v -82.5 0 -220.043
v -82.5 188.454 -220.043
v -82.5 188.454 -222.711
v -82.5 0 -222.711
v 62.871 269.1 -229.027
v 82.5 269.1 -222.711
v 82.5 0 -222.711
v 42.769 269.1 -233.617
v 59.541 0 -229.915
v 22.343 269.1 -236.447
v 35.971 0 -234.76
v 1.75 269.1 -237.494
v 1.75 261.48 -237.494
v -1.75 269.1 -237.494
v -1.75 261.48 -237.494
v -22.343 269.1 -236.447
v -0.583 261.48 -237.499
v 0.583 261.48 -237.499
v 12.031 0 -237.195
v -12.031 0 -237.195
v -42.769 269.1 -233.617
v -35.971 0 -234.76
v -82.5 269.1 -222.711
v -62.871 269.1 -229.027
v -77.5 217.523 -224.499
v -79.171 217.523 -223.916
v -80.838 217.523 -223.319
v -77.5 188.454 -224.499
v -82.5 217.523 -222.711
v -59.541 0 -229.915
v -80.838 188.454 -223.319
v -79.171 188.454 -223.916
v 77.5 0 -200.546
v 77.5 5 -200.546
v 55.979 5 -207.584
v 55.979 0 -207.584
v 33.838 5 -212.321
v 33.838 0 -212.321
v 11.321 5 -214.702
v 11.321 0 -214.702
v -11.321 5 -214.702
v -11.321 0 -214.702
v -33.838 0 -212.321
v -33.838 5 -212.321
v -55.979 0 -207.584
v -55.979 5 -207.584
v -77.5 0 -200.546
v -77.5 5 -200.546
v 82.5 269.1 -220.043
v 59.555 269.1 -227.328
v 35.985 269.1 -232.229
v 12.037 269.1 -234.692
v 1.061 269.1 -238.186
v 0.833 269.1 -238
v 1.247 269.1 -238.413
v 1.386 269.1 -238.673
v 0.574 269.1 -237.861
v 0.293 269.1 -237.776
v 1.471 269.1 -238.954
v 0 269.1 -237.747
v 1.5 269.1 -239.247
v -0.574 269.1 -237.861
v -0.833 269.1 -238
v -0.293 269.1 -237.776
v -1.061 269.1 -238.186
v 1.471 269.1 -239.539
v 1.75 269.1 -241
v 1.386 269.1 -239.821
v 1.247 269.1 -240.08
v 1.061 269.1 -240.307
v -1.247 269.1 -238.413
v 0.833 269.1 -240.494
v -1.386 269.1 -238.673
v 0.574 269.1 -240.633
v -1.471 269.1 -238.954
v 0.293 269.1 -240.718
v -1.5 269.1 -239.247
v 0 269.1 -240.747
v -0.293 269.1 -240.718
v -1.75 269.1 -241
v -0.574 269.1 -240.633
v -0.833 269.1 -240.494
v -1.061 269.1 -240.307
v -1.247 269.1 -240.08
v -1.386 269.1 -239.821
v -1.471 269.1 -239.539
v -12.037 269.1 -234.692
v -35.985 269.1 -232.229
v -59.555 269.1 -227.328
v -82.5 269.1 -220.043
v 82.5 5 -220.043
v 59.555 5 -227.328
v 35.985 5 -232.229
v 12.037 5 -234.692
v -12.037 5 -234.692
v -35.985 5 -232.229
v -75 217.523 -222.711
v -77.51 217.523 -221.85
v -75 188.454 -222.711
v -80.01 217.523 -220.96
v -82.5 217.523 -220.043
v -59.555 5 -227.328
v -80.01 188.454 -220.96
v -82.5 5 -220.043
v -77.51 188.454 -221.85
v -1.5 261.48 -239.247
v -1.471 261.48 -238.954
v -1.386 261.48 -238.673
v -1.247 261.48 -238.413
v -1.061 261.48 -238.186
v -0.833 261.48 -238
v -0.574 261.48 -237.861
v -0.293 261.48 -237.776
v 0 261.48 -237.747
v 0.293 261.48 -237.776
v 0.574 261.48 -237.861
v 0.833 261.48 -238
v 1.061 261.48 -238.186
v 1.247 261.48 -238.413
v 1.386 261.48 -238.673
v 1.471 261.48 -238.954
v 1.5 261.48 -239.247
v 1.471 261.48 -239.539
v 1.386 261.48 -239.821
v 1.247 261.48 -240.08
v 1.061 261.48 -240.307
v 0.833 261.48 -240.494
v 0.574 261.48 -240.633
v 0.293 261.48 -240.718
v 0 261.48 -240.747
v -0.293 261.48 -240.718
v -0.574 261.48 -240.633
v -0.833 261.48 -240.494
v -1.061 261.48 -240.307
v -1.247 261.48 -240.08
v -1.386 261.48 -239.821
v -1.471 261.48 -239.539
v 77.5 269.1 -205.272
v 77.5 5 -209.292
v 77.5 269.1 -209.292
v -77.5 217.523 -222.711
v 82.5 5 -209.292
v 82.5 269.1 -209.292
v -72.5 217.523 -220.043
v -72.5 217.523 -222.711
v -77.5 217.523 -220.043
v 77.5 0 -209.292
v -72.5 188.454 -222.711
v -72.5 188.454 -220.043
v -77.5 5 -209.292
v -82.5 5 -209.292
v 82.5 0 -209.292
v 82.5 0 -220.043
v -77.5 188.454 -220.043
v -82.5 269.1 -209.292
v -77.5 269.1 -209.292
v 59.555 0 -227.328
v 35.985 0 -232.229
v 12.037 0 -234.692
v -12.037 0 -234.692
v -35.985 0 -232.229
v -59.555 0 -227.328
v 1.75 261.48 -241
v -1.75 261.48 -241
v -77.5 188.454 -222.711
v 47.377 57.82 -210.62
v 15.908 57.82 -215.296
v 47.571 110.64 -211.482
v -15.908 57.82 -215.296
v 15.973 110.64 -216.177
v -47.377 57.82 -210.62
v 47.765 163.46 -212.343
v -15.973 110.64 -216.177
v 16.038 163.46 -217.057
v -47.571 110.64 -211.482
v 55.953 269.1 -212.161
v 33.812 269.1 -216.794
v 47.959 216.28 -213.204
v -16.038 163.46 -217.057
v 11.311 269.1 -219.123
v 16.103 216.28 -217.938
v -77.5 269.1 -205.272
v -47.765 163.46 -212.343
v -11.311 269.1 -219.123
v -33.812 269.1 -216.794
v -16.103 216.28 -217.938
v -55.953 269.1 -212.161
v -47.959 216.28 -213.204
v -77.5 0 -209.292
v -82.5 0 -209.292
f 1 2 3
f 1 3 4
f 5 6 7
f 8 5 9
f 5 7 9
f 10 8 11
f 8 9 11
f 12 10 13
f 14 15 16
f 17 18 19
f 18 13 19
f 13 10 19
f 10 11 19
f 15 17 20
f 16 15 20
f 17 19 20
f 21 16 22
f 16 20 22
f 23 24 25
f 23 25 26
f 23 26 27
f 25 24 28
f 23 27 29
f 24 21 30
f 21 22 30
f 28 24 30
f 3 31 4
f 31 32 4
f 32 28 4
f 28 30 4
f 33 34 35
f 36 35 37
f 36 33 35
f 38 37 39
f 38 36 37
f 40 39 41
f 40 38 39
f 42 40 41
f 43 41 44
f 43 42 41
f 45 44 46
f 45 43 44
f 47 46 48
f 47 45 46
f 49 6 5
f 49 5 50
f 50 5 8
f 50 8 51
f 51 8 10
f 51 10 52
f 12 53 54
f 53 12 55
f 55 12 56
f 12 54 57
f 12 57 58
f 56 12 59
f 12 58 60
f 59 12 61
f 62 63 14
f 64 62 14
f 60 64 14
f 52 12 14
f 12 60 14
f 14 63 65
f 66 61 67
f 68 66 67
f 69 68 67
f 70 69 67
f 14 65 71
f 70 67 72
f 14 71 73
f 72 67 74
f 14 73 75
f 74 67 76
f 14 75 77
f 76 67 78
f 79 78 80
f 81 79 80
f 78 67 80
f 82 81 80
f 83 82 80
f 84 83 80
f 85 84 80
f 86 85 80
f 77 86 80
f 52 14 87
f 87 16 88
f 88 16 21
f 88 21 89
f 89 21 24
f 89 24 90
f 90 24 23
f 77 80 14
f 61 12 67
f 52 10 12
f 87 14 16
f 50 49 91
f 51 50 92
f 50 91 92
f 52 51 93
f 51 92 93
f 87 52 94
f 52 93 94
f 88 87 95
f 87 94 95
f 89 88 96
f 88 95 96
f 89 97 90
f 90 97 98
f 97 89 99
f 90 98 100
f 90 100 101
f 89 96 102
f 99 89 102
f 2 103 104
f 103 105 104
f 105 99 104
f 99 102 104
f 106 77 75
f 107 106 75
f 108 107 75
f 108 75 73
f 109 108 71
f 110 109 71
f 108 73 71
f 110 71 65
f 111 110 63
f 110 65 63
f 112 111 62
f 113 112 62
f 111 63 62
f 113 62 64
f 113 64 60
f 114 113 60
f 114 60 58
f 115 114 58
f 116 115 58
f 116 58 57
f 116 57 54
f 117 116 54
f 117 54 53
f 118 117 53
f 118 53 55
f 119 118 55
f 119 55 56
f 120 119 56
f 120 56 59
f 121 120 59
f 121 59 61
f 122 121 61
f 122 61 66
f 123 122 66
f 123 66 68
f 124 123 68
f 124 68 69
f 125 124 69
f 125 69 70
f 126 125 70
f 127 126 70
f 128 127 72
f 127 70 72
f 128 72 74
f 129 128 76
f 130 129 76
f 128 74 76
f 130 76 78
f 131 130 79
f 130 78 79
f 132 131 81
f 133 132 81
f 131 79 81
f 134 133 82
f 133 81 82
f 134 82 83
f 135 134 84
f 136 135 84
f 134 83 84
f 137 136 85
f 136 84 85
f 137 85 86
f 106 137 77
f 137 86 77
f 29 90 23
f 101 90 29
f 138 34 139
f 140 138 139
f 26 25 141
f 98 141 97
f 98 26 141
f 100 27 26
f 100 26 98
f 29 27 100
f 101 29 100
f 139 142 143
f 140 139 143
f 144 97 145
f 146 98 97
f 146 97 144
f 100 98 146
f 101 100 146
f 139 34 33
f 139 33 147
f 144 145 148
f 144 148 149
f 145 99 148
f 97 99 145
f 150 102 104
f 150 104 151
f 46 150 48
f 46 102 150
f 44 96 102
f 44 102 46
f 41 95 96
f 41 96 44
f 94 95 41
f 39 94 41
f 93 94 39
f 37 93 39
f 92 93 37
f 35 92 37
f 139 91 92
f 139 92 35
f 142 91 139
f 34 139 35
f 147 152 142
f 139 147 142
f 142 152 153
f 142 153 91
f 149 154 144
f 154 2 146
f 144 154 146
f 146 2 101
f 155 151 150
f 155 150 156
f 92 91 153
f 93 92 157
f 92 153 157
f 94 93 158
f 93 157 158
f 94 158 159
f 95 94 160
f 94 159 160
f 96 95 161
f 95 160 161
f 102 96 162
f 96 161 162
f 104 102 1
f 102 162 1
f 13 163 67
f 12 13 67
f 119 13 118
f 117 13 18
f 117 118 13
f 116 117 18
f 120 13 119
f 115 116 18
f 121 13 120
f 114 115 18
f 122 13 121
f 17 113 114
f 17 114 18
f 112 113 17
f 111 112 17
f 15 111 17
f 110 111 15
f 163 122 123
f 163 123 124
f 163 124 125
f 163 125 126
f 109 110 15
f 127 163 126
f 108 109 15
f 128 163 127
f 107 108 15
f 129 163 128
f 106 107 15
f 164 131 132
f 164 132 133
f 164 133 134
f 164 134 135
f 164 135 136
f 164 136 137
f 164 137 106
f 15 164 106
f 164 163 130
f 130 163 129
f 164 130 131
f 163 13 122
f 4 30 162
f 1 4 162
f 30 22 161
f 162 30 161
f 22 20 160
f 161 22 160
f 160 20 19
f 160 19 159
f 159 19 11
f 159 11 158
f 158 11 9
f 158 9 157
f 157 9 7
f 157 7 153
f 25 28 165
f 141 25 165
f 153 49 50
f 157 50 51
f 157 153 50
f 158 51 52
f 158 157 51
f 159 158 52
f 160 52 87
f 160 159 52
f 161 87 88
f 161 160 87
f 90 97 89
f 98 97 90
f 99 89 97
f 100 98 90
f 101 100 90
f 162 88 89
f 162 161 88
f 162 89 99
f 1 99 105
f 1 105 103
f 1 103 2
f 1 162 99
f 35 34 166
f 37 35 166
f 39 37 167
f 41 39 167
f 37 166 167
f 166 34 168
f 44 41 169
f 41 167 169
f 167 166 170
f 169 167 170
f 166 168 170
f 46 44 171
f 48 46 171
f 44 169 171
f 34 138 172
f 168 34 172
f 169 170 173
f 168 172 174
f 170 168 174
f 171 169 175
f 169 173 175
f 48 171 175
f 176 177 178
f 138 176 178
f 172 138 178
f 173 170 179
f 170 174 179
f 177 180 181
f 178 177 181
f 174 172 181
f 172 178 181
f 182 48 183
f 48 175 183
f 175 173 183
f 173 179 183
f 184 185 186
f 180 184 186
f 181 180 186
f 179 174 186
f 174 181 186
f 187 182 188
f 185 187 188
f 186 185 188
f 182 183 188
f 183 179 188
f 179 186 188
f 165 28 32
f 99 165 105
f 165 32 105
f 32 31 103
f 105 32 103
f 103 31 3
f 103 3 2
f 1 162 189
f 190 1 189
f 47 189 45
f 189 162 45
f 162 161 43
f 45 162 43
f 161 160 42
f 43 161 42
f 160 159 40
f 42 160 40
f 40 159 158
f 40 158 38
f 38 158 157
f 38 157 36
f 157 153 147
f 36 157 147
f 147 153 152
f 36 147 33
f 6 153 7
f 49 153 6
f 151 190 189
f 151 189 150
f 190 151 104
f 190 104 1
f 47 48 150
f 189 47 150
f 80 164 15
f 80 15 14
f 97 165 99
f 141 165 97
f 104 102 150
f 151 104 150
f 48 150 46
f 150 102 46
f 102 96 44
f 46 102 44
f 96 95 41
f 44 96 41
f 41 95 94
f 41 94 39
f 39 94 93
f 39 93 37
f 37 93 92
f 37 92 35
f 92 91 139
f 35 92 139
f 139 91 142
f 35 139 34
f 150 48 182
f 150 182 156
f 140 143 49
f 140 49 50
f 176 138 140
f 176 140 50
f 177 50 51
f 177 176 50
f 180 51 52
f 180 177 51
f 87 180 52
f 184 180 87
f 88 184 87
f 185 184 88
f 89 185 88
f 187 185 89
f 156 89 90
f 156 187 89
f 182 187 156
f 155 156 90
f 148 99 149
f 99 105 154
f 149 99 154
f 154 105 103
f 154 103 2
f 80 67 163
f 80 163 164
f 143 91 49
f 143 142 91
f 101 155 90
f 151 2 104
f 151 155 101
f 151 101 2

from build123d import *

# Parameters (mm, degrees)
SKETCH1_R                            = 237.5
SKETCH1_R_2                          = 235
BOSS_EXTRUDE1_DEPTH                  = 316.6
SKETCH3_R                            = 235
SKETCH3_R_2                          = 215
BOSS_EXTRUDE2_DEPTH                  = 5
SKETCH7_R                            = 237.5
SKETCH7_R_2                          = 175
BOSS_EXTRUDE3_DEPTH                  = 2.5
SKETCH8_R                            = 235
SKETCH8_R_2                          = 175
BOSS_EXTRUDE4_DEPTH                  = 2.5
SKETCH9_R                            = 235
BOSS_EXTRUDE5_DEPTH                  = 299.1
CUT_EXTRUDE5_REACH                   = 621.561
SKETCH5_W                            = 42.50000009
SKETCH5_H                            = 45.600000066
CUT_EXTRUDE10_START                  = -475.0000001
CUT_EXTRUDE10_DEPTH                  = 475.0000001
CUT_EXTRUDE10_2_DEPTH                = 50.034190288
SKETCH16_W                           = 3.5
SKETCH16_H                           = 7.62
BOSS_EXTRUDE6_DEPTH                  = 3.5
BOSS_EXTRUDE6_DIRECTION_2_REACH      = 286.146
BOSS_EXTRUDE6_DIRECTION_2_END_RADIUS = 237.5
SKETCH17_R                           = 1.5
CUT_EXTRUDE11_DEPTH                  = 371.542926011
CUT_EXTRUDE15_DEPTH                  = 5
CUT_EXTRUDE16_DEPTH                  = 5
SKETCH20_W                           = 10.655659882
SKETCH20_H                           = 29.069608239
CUT_EXTRUDE17_DEPTH                  = 5
SKETCH21_W                           = 2.667965003
SKETCH21_H                           = 29.069608239
CUT_EXTRUDE18_DEPTH                  = 5


# Read off the part's stored shape, not the designer's step: Cut-Extrude10
with BuildPart() as part:
    # Sketch1 → Boss-Extrude1 (new body)
    with BuildSketch(Plane(origin=(0, 0, 0), x_dir=(1, 0, 0), z_dir=(0, 1, 0))):
        with Locations(Location((0, 0, 0), (0, 0, 270))):
            Circle(SKETCH1_R)
        with Locations(Location((0, 0, 0), (0, 0, 270))):
            Circle(SKETCH1_R_2, mode=Mode.SUBTRACT)
    extrude(amount=BOSS_EXTRUDE1_DEPTH)


with BuildPart() as body_2:
    # Sketch3 → Boss-Extrude2 (new body)
    with BuildSketch(Plane(origin=(0, 0, 0), x_dir=(1, 0, 0), z_dir=(0, 1, 0))):
        with Locations(Location((0, 0, 0), (0, 0, 270))):
            Circle(SKETCH3_R)
        with Locations(Location((0, 0, 0), (0, 0, 270))):
            Circle(SKETCH3_R_2, mode=Mode.SUBTRACT)
    extrude(amount=BOSS_EXTRUDE2_DEPTH)


with BuildPart() as body_3:
    # Sketch7 → Boss-Extrude3 (new body)
    with BuildSketch(Plane(origin=(0, 316.6, 0), x_dir=(1, 0, 0), z_dir=(0, 1, 0))):
        with Locations(Location((0, 0, 0), (0, 0, 270))):
            Circle(SKETCH7_R)
        with Locations(Location((0, 0, 0), (0, 0, 270))):
            Circle(SKETCH7_R_2, mode=Mode.SUBTRACT)
    extrude(amount=BOSS_EXTRUDE3_DEPTH)


with BuildPart() as body_4:
    # Sketch8 → Boss-Extrude4 (new body)
    with BuildSketch(Plane(origin=(0, 306.6, 0), x_dir=(1, 0, 0), z_dir=(0, 1, 0))):
        with Locations(Location((0, 0, 0), (0, 0, 270))):
            Circle(SKETCH8_R)
        with Locations(Location((0, 0, 0), (0, 0, 270))):
            Circle(SKETCH8_R_2, mode=Mode.SUBTRACT)
    extrude(amount=-BOSS_EXTRUDE4_DEPTH)


with BuildPart() as body_5:
    # Sketch9 → Boss-Extrude5 (new body)
    with BuildSketch(Plane(origin=(0, 5, 0), x_dir=(1, 0, 0), z_dir=(0, 1, 0))):
        with Locations(Location((0, 0, 0), (0, 0, 270))):
            Circle(SKETCH9_R)
    extrude(amount=BOSS_EXTRUDE5_DEPTH)

    # Sketch13 → Cut-Revolve2 (revolve, cut)
    with BuildSketch(Plane.XY, mode=Mode.PRIVATE) as cut_revolve2_sk:
        Polygon((0, 5), (-215, 5), (-220, 304.1), (0, 304.1), align=None)
    revolve(cut_revolve2_sk.sketch.rotate(Axis((0, 5, 0), (0, 1, 0)), 270), axis=Axis((0, 5, 0), (0, 1, 0)), mode=Mode.SUBTRACT)


with BuildPart() as cut_extrude5_tool:
    # Cut-Extrude5: up to this cone (the profile starts outside it)
    cut_extrude5_end = Plane(origin=(0, 22.8, 0), z_dir=(0, 1, 0)) * Cone(201.299589446, 229.295529243, 1674.717118689, mode=Mode.PRIVATE)
    # Sketch5 → Cut-Extrude5 (new, up to the surface)
    with BuildSketch(Plane.XY.offset(237.5), mode=Mode.PRIVATE) as cut_extrude5_sk1:
        with Locations((0, 22.800000033)):
            Rectangle(SKETCH5_W, SKETCH5_H)
    cut_extrude5_tool1 = extrude(cut_extrude5_sk1.sketch, amount=-CUT_EXTRUDE5_REACH, mode=Mode.PRIVATE) - cut_extrude5_end
    add(cut_extrude5_tool1.solids().sort_by_distance((0, 22.8, 237.5))[0])


with BuildPart() as part_1:
    add(part.part)

    # Cut-Extrude5: cut by cut_extrude5_tool
    add(cut_extrude5_tool.part, mode=Mode.SUBTRACT)


with BuildPart() as body_2_1:
    add(body_2.part)

    # Cut-Extrude5: cut by cut_extrude5_tool
    add(cut_extrude5_tool.part, mode=Mode.SUBTRACT)


with BuildPart() as body_5_1:
    add(body_5.part)

    # Cut-Extrude5: cut by cut_extrude5_tool
    add(cut_extrude5_tool.part, mode=Mode.SUBTRACT)


with BuildPart() as cut_extrude10_tool:
    # Cut-Extrude10 outline → Cut-Extrude10 (new body)
    with BuildSketch(Plane(origin=(0, 0, -237.5), x_dir=(-1, 0, 0), z_dir=(0, 0, -1)).offset(CUT_EXTRUDE10_START)):
        Polygon((-82.5, 269.1), (82.5, 269.1), (82.5, 5), (82.5, 0), (334.900743923, 0), (334.900743923, 341.395751283), (-301.356566018, 341.395751283), (-301.356566018, 0), (-82.5, 0), (-82.5, 5), align=None)
    extrude(amount=CUT_EXTRUDE10_DEPTH)


with BuildPart() as part_2:
    add(part_1.part)

    # Cut-Extrude10: cut by cut_extrude10_tool
    add(cut_extrude10_tool.part, mode=Mode.SUBTRACT)


with BuildPart() as body_2_2:
    add(body_2_1.part)

    # Cut-Extrude10: cut by cut_extrude10_tool
    add(cut_extrude10_tool.part, mode=Mode.SUBTRACT)


with BuildPart() as body_3_1:
    add(body_3.part)

    # Cut-Extrude10: cut by cut_extrude10_tool
    add(cut_extrude10_tool.part, mode=Mode.SUBTRACT)


with BuildPart() as body_4_1:
    add(body_4.part)

    # Cut-Extrude10: cut by cut_extrude10_tool
    add(cut_extrude10_tool.part, mode=Mode.SUBTRACT)


with BuildPart() as body_5_2:
    add(body_5_1.part)

    # Cut-Extrude10: cut by cut_extrude10_tool
    add(cut_extrude10_tool.part, mode=Mode.SUBTRACT)


with BuildPart() as cut_extrude10_2_tool:
    # Cut-Extrude10 2 outline → Cut-Extrude10 2 (new body)
    with BuildSketch(Plane(origin=(0, 0, -237.5), x_dir=(-1, 0, 0), z_dir=(0, 0, -1)).offset(CUT_EXTRUDE10_START)):
        Polygon((82.5, 269.1), (-82.5, 269.1), (-82.5, 0), (-21.250000045, 0), (-21.250000045, 45.600000066), (21.250000045, 45.600000066), (21.250000045, 0), (82.5, 0), align=None)
    extrude(amount=CUT_EXTRUDE10_2_DEPTH)


with BuildPart() as part_3:
    add(part_2.part)

    # Cut-Extrude10 2: cut by cut_extrude10_2_tool
    add(cut_extrude10_2_tool.part, mode=Mode.SUBTRACT)

    # Sketch16 → Boss-Extrude6 (add)
    with BuildSketch(Plane(origin=(0, 0, -237.5), x_dir=(-1, 0, 0), z_dir=(0, 0, -1))):
        with Locations((0, 265.29)):
            Rectangle(SKETCH16_W, SKETCH16_H)
    extrude(amount=BOSS_EXTRUDE6_DEPTH)

    # Boss-Extrude6 direction 2: up to this cylinder (the profile starts outside it)
    boss_extrude6_direction_2_end = Plane(origin=(0, 265.29, 0), z_dir=(0, -1, 0)) * Cylinder(BOSS_EXTRUDE6_DIRECTION_2_END_RADIUS, 1048.292, mode=Mode.PRIVATE)
    # Sketch16 → Boss-Extrude6 direction 2 (add, up to the surface)
    with BuildSketch(Plane(origin=(0, 0, -237.5), x_dir=(-1, 0, 0), z_dir=(0, 0, -1)), mode=Mode.PRIVATE) as boss_extrude6_direction_2_sk1:
        with Locations((0, 265.29)):
            Rectangle(SKETCH16_W, SKETCH16_H)
    boss_extrude6_direction_2_tool1 = extrude(boss_extrude6_direction_2_sk1.sketch, amount=-BOSS_EXTRUDE6_DIRECTION_2_REACH, mode=Mode.PRIVATE) - boss_extrude6_direction_2_end
    add(boss_extrude6_direction_2_tool1.solids().sort_by_distance((0, 265.29, -237.5))[0])
    add(boss_extrude6_direction_2_tool1.solids().sort_by_distance((0, 265.29, -237.5))[1])

    # Sketch17 → Cut-Extrude11 (cut, through all)
    with BuildSketch(Plane(origin=(0, 269.1, 0), x_dir=(1, 0, 0), z_dir=(0, 1, 0))):
        with Locations(Location((0, 239.246776272, 0), (0, 0, 180))):
            Circle(SKETCH17_R)
    extrude(amount=-CUT_EXTRUDE11_DEPTH, mode=Mode.SUBTRACT)


with BuildPart() as body_2_3:
    add(body_2_2.part)

    # Cut-Extrude10 2: cut by cut_extrude10_2_tool
    add(cut_extrude10_2_tool.part, mode=Mode.SUBTRACT)


with BuildPart() as body_5_3:
    add(body_5_2.part)

    # Cut-Extrude10 2: cut by cut_extrude10_2_tool
    add(cut_extrude10_2_tool.part, mode=Mode.SUBTRACT)


with BuildPart() as cut_extrude15_tool:
    # Sketch19 → Cut-Extrude15 (new body)
    with BuildSketch(Plane.ZY.offset(82.5)):
        Polygon((-198.541557363, 0), (-209.292083436, 0), (-209.292083436, 269.1), (-203.252536555, 269.1), (-198.541557363, 5), align=None)
    extrude(amount=-CUT_EXTRUDE15_DEPTH)


with BuildPart() as body_2_4:
    add(body_2_3.part)

    # Cut-Extrude15: cut by cut_extrude15_tool
    add(cut_extrude15_tool.part, mode=Mode.SUBTRACT)


with BuildPart() as body_5_4:
    add(body_5_3.part)

    # Cut-Extrude15: cut by cut_extrude15_tool
    add(cut_extrude15_tool.part, mode=Mode.SUBTRACT)


with BuildPart() as cut_extrude16_tool:
    # Sketch18 → Cut-Extrude16 (new body)
    with BuildSketch(Plane(origin=(82.5, 0, 0), x_dir=(0, 0, -1), z_dir=(1, 0, 0))):
        Polygon((198.541557363, 0), (209.292083436, 0), (209.292083436, 269.1), (203.31417399, 269.1), (198.541557363, 5), align=None)
    extrude(amount=-CUT_EXTRUDE16_DEPTH)


with BuildPart() as body_2_5:
    add(body_2_4.part)

    # Cut-Extrude16: cut by cut_extrude16_tool
    add(cut_extrude16_tool.part, mode=Mode.SUBTRACT)


with BuildPart() as body_5_5:
    add(body_5_4.part)

    # Cut-Extrude16: cut by cut_extrude16_tool
    add(cut_extrude16_tool.part, mode=Mode.SUBTRACT)


with BuildPart() as cut_extrude17_tool:
    # Sketch20 → Cut-Extrude17 (new body)
    with BuildSketch(Plane.ZY.offset(82.5)):
        with Locations((-225.370439451, 202.988321817)):
            Rectangle(SKETCH20_W, SKETCH20_H)
    extrude(amount=-CUT_EXTRUDE17_DEPTH)


with BuildPart() as part_4:
    add(part_3.part)

    # Cut-Extrude17: cut by cut_extrude17_tool
    add(cut_extrude17_tool.part, mode=Mode.SUBTRACT)


with BuildPart() as body_5_6:
    add(body_5_5.part)

    # Cut-Extrude17: cut by cut_extrude17_tool
    add(cut_extrude17_tool.part, mode=Mode.SUBTRACT)


with BuildPart() as cut_extrude18_tool:
    # Sketch21 → Cut-Extrude18 (new body)
    with BuildSketch(Plane.ZY.offset(77.5)):
        with Locations((-221.376592012, 202.988321817)):
            Rectangle(SKETCH21_W, SKETCH21_H)
    extrude(amount=-CUT_EXTRUDE18_DEPTH)


with BuildPart() as part_5:
    add(part_4.part)

    # Cut-Extrude18: cut by cut_extrude18_tool
    add(cut_extrude18_tool.part, mode=Mode.SUBTRACT)


with BuildPart() as body_5_7:
    add(body_5_6.part)

    # Cut-Extrude18: cut by cut_extrude18_tool
    add(cut_extrude18_tool.part, mode=Mode.SUBTRACT)


solid = Compound([body_2_5.part, part_5.part, body_5_7.part])
